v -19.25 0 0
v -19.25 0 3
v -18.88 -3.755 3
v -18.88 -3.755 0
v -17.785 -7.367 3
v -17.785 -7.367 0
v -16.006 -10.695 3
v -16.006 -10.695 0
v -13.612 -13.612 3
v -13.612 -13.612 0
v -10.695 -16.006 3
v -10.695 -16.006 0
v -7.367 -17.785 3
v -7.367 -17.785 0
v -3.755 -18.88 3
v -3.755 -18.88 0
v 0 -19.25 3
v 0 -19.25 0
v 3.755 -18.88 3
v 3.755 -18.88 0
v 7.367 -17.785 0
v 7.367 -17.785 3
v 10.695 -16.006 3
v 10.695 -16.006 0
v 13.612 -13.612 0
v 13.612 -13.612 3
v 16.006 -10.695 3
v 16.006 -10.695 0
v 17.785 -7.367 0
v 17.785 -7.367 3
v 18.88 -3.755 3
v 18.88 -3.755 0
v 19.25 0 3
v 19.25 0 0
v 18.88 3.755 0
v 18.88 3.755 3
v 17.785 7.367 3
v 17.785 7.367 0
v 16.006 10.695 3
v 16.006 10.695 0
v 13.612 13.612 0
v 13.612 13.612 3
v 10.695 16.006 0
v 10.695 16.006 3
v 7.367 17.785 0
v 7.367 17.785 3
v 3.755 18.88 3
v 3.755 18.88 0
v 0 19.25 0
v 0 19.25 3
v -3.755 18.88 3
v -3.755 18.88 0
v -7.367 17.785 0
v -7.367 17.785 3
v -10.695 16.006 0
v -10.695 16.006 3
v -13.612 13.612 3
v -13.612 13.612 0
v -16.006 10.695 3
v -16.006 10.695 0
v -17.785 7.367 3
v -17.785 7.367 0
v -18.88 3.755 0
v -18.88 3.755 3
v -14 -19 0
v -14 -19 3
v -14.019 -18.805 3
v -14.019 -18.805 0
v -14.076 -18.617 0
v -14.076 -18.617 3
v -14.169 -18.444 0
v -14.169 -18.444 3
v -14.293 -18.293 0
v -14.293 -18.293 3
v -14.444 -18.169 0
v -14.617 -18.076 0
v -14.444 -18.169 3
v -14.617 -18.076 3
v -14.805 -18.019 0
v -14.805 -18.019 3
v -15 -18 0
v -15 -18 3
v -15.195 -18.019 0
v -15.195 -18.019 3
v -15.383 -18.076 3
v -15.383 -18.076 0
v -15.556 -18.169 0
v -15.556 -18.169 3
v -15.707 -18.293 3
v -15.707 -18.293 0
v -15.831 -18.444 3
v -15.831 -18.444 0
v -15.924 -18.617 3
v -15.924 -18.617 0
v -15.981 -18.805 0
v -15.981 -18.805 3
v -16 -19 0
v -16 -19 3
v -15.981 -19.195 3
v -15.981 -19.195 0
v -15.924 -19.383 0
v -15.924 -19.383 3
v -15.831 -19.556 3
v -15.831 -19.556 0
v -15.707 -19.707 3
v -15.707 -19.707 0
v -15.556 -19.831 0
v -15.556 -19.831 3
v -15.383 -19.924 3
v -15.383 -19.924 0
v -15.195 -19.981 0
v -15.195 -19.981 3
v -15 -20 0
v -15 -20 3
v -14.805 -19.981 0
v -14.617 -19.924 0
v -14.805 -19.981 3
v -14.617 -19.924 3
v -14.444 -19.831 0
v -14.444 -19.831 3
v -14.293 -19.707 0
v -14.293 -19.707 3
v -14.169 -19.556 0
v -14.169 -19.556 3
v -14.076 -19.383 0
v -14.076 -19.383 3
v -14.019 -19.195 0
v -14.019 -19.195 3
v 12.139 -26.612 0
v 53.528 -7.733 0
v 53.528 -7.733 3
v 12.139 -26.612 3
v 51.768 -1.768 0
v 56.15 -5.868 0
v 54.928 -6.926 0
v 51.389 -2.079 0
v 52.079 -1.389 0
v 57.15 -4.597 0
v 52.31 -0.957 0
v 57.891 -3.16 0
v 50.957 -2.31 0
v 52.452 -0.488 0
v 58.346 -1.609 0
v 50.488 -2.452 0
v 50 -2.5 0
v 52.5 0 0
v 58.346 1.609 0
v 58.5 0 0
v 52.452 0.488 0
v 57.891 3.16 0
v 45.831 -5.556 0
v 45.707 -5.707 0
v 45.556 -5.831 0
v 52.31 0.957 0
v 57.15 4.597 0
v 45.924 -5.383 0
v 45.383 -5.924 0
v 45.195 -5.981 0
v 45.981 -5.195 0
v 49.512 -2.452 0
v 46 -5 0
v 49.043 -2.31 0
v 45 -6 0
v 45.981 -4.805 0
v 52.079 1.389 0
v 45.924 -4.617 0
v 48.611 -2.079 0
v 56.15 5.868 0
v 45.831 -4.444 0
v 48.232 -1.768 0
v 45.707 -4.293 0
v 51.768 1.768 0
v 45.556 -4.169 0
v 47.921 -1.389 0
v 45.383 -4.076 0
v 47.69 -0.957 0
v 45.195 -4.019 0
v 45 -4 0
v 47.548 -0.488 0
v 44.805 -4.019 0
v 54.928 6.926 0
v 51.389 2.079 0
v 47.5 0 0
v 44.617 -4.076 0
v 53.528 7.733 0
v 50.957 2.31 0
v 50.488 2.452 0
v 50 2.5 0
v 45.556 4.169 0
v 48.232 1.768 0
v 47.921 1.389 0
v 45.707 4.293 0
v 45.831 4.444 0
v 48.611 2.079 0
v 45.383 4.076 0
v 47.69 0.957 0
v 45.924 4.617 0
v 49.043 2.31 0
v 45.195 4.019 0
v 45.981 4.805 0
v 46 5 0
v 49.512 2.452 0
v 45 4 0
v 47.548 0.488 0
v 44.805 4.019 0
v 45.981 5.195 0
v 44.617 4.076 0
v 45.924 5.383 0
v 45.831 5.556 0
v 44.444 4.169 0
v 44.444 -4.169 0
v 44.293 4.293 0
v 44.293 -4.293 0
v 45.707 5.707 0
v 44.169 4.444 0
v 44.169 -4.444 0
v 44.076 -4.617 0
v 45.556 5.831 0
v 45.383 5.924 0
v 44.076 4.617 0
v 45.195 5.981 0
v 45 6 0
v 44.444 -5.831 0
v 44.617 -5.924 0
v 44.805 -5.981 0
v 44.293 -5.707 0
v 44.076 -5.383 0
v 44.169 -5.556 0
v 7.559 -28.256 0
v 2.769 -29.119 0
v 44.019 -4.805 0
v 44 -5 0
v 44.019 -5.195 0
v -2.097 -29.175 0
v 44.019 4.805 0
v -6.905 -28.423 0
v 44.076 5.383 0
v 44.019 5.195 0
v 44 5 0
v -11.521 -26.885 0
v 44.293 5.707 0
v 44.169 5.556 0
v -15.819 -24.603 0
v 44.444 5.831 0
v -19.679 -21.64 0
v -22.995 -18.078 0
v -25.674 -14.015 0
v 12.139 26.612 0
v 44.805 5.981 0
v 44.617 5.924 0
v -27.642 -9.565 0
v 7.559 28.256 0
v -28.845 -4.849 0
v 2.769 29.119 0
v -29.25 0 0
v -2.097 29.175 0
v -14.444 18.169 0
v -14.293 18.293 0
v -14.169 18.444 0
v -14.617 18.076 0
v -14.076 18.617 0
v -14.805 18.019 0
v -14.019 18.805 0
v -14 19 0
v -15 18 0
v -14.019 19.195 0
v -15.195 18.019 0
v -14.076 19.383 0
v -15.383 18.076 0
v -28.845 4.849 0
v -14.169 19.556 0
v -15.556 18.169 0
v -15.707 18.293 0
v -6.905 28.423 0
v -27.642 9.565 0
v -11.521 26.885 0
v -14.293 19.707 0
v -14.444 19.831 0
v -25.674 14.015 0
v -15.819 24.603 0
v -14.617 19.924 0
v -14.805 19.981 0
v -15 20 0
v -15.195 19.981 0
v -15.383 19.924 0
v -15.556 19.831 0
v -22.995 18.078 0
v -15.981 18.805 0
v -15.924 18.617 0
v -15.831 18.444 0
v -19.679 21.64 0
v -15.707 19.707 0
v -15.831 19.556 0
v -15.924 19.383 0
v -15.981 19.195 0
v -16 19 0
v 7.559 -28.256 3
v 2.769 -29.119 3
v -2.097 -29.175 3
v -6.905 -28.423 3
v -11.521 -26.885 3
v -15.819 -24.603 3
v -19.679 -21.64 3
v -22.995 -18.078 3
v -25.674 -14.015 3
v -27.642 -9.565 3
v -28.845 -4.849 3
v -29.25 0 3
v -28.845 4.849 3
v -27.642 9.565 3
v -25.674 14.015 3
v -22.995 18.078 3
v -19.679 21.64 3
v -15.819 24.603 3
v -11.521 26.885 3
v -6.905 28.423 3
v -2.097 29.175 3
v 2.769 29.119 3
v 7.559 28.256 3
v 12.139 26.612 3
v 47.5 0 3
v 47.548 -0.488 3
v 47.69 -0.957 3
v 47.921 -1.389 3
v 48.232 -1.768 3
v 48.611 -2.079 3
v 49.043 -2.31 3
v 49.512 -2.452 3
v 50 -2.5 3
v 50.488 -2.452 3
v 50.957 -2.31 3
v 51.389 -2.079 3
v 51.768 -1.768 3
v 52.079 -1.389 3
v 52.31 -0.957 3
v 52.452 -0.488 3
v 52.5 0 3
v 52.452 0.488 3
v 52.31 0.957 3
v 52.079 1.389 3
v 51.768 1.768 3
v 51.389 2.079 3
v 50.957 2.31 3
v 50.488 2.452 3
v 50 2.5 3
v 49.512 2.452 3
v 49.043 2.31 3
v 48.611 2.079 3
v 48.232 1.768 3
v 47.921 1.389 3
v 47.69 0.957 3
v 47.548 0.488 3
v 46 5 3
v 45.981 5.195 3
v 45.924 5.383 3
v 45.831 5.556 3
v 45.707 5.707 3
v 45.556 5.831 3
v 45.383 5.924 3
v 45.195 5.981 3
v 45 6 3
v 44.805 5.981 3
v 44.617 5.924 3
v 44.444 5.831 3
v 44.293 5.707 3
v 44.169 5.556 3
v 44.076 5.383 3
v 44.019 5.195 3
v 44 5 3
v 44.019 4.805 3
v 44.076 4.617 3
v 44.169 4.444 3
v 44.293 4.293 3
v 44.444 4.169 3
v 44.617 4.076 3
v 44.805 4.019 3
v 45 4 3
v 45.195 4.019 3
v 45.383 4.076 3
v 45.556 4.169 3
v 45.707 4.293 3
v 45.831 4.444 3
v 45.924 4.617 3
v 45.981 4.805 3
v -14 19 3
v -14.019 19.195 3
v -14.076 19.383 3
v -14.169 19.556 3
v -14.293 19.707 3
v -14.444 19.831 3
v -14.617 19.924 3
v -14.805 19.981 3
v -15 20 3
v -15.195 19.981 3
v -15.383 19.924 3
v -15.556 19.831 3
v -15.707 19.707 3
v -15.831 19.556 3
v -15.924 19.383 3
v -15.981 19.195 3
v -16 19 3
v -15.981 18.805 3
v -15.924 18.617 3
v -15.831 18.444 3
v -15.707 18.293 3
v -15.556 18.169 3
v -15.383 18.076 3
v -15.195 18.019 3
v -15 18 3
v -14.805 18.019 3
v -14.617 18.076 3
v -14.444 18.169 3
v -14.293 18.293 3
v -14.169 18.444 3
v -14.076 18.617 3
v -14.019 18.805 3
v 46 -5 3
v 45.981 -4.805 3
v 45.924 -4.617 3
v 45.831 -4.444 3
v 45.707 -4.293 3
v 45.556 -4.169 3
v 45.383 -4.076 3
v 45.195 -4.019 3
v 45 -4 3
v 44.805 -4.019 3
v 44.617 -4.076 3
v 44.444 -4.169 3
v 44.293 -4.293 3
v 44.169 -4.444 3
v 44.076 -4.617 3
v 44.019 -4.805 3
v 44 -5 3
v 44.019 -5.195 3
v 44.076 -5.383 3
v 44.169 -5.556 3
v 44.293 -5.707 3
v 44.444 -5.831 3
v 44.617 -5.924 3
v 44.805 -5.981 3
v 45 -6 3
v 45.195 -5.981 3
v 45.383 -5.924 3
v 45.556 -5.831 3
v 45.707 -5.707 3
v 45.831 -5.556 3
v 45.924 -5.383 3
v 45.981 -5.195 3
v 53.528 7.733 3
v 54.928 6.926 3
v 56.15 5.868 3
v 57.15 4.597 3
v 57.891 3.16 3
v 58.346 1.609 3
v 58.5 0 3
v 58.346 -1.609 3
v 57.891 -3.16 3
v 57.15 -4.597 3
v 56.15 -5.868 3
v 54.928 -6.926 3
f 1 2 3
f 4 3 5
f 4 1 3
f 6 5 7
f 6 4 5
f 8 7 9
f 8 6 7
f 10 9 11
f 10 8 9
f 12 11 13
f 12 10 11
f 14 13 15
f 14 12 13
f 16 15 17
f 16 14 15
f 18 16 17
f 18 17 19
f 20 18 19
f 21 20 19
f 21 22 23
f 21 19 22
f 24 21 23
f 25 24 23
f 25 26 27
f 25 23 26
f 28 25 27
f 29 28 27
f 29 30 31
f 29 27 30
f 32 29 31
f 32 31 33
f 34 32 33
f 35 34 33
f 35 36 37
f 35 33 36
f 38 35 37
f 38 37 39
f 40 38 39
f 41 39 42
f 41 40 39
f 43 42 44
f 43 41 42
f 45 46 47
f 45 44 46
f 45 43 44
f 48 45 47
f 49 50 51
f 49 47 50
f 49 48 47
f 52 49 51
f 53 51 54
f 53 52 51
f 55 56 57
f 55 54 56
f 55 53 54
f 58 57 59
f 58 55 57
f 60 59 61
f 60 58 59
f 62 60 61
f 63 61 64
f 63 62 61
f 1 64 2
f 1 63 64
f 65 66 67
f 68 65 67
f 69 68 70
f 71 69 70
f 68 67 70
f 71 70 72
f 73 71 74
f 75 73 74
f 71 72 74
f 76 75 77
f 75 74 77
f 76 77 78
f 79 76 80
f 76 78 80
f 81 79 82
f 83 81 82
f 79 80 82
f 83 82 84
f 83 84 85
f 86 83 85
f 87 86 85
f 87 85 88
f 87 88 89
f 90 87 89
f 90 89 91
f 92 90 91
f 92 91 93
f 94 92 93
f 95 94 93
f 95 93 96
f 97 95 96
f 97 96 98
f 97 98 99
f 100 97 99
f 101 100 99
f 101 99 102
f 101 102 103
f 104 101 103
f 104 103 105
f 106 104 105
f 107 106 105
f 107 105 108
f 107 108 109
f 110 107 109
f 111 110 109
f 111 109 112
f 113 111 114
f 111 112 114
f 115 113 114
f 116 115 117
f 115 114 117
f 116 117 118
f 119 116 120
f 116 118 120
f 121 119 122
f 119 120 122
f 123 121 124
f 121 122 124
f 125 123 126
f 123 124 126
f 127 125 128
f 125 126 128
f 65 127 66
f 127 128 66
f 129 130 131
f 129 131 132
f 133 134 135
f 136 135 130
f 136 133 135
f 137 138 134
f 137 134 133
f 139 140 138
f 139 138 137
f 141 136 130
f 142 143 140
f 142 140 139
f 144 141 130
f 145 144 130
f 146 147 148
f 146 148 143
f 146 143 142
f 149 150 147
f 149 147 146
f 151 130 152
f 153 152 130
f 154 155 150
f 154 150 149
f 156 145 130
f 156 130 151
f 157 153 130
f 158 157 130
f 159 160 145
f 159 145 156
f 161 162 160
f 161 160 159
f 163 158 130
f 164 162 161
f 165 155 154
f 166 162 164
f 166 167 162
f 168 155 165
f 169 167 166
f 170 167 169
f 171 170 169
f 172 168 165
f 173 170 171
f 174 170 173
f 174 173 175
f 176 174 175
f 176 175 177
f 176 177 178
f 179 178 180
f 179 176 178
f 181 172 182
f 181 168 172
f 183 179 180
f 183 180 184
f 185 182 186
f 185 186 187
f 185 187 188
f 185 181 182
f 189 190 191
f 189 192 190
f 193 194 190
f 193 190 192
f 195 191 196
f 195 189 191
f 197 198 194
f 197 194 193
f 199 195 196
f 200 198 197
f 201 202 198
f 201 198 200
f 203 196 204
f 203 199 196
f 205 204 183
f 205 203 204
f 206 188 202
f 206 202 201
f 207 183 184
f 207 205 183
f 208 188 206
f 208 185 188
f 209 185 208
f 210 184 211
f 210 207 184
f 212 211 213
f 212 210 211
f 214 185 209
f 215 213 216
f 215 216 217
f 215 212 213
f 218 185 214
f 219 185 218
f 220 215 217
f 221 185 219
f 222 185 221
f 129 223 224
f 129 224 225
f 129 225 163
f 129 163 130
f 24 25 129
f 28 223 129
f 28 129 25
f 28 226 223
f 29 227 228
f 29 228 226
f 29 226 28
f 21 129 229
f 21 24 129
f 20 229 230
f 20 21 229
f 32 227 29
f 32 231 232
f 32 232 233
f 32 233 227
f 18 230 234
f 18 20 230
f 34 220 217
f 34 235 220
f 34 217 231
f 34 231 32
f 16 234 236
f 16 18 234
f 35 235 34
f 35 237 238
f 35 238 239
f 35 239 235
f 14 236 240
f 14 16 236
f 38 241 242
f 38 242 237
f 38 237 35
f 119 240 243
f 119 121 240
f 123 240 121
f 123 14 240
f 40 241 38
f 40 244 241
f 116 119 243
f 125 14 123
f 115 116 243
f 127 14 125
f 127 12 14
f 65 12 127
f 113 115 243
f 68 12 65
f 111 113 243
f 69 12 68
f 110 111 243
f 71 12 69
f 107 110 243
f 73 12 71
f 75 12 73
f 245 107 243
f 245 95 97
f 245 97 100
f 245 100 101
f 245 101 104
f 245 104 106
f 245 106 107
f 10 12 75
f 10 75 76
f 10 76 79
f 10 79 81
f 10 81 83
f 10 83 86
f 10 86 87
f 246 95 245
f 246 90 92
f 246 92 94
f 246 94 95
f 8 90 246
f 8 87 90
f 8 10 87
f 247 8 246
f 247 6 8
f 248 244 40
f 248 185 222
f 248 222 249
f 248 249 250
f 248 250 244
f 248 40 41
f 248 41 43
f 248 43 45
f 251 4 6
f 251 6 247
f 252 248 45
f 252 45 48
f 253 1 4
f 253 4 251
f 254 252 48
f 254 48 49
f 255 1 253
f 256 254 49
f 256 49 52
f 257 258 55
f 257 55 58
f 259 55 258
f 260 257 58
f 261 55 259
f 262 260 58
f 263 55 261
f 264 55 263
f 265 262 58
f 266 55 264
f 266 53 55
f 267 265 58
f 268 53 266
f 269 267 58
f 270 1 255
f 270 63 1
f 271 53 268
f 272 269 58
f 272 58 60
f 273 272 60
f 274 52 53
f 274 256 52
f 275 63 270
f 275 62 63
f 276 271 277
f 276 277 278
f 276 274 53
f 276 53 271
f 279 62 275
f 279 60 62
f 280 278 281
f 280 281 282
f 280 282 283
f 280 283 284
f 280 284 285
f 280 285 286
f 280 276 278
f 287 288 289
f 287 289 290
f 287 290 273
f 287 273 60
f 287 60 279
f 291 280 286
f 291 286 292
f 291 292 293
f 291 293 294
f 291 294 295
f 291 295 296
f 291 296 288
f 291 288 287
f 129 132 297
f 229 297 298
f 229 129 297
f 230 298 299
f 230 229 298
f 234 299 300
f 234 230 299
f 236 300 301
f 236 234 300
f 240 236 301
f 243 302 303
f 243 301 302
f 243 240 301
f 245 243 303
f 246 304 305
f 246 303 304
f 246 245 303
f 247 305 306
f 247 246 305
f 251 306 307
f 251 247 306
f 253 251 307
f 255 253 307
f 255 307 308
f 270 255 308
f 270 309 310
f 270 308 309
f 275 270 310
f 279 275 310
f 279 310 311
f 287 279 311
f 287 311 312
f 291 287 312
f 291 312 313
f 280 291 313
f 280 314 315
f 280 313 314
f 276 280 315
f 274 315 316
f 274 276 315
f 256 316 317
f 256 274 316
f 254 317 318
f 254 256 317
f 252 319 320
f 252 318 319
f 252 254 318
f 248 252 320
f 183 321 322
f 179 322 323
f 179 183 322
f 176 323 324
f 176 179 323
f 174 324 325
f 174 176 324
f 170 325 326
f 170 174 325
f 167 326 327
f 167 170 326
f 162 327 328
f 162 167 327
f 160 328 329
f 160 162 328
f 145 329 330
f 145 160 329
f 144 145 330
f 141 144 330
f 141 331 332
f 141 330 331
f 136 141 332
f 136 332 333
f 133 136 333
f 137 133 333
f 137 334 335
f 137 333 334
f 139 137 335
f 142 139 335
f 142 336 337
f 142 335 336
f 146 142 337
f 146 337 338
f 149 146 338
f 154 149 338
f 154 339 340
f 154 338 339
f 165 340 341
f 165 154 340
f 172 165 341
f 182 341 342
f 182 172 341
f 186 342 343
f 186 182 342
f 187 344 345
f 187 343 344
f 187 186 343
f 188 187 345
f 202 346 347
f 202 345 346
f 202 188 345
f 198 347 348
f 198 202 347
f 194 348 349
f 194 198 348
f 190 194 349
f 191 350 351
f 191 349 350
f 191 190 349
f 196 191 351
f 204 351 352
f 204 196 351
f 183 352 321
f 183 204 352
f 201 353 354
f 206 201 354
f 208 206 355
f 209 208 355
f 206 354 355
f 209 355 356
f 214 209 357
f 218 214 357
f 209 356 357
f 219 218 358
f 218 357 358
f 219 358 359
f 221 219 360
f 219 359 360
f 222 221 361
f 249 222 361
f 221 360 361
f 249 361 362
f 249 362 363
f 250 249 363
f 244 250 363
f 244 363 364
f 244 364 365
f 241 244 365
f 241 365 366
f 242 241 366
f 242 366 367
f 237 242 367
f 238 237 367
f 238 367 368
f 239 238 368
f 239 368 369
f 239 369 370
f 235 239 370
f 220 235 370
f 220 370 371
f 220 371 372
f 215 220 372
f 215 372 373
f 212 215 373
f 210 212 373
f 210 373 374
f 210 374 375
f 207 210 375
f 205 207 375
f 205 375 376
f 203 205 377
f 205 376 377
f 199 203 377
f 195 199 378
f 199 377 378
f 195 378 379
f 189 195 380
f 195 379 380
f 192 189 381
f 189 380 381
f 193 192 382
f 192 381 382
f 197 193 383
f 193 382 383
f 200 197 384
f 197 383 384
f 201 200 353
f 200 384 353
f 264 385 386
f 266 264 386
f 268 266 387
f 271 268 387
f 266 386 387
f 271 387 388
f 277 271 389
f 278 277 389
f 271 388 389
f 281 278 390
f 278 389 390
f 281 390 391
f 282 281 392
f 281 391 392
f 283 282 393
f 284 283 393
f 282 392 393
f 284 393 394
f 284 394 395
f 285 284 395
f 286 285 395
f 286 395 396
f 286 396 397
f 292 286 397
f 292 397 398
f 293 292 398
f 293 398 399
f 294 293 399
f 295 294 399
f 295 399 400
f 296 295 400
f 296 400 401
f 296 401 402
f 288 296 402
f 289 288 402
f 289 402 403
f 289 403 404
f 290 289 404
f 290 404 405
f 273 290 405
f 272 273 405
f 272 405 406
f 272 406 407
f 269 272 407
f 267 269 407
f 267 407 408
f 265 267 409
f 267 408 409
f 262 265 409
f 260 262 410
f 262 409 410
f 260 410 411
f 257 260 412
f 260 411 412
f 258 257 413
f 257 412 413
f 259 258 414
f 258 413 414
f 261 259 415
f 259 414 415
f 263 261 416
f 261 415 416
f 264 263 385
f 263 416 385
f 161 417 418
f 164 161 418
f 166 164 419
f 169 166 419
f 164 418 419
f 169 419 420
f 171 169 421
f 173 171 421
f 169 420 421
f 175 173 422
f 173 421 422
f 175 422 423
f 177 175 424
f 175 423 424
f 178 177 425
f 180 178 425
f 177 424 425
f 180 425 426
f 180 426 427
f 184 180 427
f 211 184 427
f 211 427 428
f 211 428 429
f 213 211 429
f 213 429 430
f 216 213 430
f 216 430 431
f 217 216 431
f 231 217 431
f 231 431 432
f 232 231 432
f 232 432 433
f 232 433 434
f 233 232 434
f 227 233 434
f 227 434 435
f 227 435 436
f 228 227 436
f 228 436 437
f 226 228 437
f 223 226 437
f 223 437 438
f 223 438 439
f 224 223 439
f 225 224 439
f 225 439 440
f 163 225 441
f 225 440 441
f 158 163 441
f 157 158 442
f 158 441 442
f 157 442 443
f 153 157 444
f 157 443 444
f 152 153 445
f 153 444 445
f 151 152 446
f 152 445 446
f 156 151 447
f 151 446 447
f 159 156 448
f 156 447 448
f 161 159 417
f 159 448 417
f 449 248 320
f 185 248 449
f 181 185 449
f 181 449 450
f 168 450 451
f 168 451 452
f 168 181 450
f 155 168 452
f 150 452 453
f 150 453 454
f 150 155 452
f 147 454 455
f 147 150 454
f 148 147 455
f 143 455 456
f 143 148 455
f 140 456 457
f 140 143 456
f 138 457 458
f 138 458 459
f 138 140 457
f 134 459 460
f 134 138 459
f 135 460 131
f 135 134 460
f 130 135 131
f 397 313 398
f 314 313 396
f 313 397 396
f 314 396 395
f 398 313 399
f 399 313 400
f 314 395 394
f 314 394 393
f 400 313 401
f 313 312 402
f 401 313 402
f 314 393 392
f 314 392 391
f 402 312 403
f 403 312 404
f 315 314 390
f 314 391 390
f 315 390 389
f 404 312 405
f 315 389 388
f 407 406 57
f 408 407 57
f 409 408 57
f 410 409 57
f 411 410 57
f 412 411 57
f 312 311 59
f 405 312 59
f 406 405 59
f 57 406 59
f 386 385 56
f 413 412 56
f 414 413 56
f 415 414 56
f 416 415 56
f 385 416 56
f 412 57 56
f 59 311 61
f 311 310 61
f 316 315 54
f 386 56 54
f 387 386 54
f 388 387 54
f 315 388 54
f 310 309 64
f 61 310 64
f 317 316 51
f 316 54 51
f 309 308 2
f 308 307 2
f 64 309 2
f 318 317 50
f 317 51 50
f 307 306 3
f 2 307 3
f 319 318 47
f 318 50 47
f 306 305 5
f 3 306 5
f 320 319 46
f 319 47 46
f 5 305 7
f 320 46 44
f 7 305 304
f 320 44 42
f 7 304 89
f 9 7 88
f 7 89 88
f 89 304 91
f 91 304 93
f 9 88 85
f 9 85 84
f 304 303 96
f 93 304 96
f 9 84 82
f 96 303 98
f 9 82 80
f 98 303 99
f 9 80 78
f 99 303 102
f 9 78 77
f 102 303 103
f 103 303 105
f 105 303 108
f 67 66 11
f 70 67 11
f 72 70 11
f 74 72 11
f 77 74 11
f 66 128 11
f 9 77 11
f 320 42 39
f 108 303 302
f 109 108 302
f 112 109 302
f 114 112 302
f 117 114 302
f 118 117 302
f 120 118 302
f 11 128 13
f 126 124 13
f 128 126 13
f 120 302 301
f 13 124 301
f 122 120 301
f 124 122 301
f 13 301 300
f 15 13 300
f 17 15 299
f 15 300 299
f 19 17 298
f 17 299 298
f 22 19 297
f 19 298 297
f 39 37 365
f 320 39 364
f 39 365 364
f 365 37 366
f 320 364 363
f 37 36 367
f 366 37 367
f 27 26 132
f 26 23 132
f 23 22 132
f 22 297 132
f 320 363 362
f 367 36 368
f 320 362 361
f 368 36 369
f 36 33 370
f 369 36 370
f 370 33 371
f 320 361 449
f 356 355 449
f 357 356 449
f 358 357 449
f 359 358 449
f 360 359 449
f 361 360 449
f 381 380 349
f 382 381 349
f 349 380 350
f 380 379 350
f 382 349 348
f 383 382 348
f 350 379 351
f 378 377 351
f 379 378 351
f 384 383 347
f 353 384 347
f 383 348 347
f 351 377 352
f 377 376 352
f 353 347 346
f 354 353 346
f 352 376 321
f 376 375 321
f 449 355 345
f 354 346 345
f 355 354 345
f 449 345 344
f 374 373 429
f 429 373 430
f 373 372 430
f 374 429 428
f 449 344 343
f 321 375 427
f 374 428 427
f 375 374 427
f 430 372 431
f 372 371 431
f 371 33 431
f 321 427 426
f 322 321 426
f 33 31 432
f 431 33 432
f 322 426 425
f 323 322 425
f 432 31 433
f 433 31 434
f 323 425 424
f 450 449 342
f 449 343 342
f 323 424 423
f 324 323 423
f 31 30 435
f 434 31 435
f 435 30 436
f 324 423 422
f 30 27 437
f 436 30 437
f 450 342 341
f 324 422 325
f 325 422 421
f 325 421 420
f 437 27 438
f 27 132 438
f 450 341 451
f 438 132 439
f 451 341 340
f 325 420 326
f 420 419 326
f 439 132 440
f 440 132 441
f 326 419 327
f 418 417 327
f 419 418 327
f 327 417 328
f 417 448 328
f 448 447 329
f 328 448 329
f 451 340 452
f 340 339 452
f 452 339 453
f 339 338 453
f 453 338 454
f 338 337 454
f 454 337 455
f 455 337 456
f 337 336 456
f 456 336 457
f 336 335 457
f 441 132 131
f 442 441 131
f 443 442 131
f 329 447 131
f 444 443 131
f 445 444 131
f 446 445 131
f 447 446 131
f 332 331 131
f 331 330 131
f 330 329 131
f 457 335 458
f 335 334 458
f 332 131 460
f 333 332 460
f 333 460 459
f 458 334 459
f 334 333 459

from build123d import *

# Parameters (mm, degrees)
ESQUISSE1_R                  = 19.25
ESQUISSE1_R_2                = 2.5
BOSS_EXTRU_1_DEPTH           = 42
ENL_V_MAT_EXTRU_1_DEPTH      = 74.881298321
ENL_V_MAT_EXTRU_1_DEPTH_BACK = 74.881298321
ESQUISSE2_W                  = 90
ESQUISSE2_H                  = 30
ESQUISSE3_R                  = 1
ENL_V_MAT_EXTRU_2_DEPTH      = 42
ENL_V_MAT_EXTRU_3_DEPTH      = 78.729096869
ENL_V_MAT_EXTRU_3_DEPTH_BACK = 78.729096869
ESQUISSE4_W                  = 87.75
ESQUISSE4_H                  = 39


with BuildPart() as part:
    # Esquisse1 → Boss.-Extru.1 (new body)
    with BuildSketch(Plane.XY):
        with BuildLine():
            Line((12.13875, 26.612276273), (53.5275, 7.733481994))
            ThreePointArc((53.5275, 7.733481994), (58.5, 0), (53.5275, -7.733481994))
            Line((53.5275, -7.733481994), (12.13875, -26.612276273))
            ThreePointArc((12.13875, -26.612276273), (-29.25, 0), (12.13875, 26.612276273))
        make_face()
        with Locations(Location((0, 0, 0), (0, 0, 180))):
            Circle(ESQUISSE1_R, mode=Mode.SUBTRACT)
        with Locations(Location((50, 0, 0), (0, 0, 180))):
            Circle(ESQUISSE1_R_2, mode=Mode.SUBTRACT)
    extrude(amount=BOSS_EXTRU_1_DEPTH)

    # Esquisse2 → Enlèv. mat.-Extru.1 (cut, two sides: drawn at the far end of the back side and taken through both)
    with BuildSketch(Plane(origin=(5.218823759, 0, 0), x_dir=(1, 0, 0), z_dir=(0, 1, 0)).offset(-ENL_V_MAT_EXTRU_1_DEPTH_BACK)):
        with Locations((-11.691323759, -21)):
            Rectangle(ESQUISSE2_W, ESQUISSE2_H)
    extrude(amount=ENL_V_MAT_EXTRU_1_DEPTH + ENL_V_MAT_EXTRU_1_DEPTH_BACK, mode=Mode.SUBTRACT)

    # Esquisse3 → Enlèv. mat.-Extru.2 (cut)
    with BuildSketch(Plane.XY.offset(42)):
        with Locations((45, 5)):
            Circle(ESQUISSE3_R)
        with Locations((45, -5)):
            Circle(ESQUISSE3_R)
        with Locations((-15, 19)):
            Circle(ESQUISSE3_R)
        with Locations((-15, -19)):
            Circle(ESQUISSE3_R)
    extrude(amount=-ENL_V_MAT_EXTRU_2_DEPTH, mode=Mode.SUBTRACT)

    # Esquisse4 → Enlèv. mat.-Extru.3 (cut, two sides: drawn at the far end of the back side and taken through both)
    with BuildSketch(Plane(origin=(0, 0, 0), x_dir=(1, 0, 0), z_dir=(0, 1, 0)).offset(-ENL_V_MAT_EXTRU_3_DEPTH_BACK)):
        with Locations((14.625, -22.5)):
            Rectangle(ESQUISSE4_W, ESQUISSE4_H)
    extrude(amount=ENL_V_MAT_EXTRU_3_DEPTH + ENL_V_MAT_EXTRU_3_DEPTH_BACK, mode=Mode.SUBTRACT)


solid = part.part
